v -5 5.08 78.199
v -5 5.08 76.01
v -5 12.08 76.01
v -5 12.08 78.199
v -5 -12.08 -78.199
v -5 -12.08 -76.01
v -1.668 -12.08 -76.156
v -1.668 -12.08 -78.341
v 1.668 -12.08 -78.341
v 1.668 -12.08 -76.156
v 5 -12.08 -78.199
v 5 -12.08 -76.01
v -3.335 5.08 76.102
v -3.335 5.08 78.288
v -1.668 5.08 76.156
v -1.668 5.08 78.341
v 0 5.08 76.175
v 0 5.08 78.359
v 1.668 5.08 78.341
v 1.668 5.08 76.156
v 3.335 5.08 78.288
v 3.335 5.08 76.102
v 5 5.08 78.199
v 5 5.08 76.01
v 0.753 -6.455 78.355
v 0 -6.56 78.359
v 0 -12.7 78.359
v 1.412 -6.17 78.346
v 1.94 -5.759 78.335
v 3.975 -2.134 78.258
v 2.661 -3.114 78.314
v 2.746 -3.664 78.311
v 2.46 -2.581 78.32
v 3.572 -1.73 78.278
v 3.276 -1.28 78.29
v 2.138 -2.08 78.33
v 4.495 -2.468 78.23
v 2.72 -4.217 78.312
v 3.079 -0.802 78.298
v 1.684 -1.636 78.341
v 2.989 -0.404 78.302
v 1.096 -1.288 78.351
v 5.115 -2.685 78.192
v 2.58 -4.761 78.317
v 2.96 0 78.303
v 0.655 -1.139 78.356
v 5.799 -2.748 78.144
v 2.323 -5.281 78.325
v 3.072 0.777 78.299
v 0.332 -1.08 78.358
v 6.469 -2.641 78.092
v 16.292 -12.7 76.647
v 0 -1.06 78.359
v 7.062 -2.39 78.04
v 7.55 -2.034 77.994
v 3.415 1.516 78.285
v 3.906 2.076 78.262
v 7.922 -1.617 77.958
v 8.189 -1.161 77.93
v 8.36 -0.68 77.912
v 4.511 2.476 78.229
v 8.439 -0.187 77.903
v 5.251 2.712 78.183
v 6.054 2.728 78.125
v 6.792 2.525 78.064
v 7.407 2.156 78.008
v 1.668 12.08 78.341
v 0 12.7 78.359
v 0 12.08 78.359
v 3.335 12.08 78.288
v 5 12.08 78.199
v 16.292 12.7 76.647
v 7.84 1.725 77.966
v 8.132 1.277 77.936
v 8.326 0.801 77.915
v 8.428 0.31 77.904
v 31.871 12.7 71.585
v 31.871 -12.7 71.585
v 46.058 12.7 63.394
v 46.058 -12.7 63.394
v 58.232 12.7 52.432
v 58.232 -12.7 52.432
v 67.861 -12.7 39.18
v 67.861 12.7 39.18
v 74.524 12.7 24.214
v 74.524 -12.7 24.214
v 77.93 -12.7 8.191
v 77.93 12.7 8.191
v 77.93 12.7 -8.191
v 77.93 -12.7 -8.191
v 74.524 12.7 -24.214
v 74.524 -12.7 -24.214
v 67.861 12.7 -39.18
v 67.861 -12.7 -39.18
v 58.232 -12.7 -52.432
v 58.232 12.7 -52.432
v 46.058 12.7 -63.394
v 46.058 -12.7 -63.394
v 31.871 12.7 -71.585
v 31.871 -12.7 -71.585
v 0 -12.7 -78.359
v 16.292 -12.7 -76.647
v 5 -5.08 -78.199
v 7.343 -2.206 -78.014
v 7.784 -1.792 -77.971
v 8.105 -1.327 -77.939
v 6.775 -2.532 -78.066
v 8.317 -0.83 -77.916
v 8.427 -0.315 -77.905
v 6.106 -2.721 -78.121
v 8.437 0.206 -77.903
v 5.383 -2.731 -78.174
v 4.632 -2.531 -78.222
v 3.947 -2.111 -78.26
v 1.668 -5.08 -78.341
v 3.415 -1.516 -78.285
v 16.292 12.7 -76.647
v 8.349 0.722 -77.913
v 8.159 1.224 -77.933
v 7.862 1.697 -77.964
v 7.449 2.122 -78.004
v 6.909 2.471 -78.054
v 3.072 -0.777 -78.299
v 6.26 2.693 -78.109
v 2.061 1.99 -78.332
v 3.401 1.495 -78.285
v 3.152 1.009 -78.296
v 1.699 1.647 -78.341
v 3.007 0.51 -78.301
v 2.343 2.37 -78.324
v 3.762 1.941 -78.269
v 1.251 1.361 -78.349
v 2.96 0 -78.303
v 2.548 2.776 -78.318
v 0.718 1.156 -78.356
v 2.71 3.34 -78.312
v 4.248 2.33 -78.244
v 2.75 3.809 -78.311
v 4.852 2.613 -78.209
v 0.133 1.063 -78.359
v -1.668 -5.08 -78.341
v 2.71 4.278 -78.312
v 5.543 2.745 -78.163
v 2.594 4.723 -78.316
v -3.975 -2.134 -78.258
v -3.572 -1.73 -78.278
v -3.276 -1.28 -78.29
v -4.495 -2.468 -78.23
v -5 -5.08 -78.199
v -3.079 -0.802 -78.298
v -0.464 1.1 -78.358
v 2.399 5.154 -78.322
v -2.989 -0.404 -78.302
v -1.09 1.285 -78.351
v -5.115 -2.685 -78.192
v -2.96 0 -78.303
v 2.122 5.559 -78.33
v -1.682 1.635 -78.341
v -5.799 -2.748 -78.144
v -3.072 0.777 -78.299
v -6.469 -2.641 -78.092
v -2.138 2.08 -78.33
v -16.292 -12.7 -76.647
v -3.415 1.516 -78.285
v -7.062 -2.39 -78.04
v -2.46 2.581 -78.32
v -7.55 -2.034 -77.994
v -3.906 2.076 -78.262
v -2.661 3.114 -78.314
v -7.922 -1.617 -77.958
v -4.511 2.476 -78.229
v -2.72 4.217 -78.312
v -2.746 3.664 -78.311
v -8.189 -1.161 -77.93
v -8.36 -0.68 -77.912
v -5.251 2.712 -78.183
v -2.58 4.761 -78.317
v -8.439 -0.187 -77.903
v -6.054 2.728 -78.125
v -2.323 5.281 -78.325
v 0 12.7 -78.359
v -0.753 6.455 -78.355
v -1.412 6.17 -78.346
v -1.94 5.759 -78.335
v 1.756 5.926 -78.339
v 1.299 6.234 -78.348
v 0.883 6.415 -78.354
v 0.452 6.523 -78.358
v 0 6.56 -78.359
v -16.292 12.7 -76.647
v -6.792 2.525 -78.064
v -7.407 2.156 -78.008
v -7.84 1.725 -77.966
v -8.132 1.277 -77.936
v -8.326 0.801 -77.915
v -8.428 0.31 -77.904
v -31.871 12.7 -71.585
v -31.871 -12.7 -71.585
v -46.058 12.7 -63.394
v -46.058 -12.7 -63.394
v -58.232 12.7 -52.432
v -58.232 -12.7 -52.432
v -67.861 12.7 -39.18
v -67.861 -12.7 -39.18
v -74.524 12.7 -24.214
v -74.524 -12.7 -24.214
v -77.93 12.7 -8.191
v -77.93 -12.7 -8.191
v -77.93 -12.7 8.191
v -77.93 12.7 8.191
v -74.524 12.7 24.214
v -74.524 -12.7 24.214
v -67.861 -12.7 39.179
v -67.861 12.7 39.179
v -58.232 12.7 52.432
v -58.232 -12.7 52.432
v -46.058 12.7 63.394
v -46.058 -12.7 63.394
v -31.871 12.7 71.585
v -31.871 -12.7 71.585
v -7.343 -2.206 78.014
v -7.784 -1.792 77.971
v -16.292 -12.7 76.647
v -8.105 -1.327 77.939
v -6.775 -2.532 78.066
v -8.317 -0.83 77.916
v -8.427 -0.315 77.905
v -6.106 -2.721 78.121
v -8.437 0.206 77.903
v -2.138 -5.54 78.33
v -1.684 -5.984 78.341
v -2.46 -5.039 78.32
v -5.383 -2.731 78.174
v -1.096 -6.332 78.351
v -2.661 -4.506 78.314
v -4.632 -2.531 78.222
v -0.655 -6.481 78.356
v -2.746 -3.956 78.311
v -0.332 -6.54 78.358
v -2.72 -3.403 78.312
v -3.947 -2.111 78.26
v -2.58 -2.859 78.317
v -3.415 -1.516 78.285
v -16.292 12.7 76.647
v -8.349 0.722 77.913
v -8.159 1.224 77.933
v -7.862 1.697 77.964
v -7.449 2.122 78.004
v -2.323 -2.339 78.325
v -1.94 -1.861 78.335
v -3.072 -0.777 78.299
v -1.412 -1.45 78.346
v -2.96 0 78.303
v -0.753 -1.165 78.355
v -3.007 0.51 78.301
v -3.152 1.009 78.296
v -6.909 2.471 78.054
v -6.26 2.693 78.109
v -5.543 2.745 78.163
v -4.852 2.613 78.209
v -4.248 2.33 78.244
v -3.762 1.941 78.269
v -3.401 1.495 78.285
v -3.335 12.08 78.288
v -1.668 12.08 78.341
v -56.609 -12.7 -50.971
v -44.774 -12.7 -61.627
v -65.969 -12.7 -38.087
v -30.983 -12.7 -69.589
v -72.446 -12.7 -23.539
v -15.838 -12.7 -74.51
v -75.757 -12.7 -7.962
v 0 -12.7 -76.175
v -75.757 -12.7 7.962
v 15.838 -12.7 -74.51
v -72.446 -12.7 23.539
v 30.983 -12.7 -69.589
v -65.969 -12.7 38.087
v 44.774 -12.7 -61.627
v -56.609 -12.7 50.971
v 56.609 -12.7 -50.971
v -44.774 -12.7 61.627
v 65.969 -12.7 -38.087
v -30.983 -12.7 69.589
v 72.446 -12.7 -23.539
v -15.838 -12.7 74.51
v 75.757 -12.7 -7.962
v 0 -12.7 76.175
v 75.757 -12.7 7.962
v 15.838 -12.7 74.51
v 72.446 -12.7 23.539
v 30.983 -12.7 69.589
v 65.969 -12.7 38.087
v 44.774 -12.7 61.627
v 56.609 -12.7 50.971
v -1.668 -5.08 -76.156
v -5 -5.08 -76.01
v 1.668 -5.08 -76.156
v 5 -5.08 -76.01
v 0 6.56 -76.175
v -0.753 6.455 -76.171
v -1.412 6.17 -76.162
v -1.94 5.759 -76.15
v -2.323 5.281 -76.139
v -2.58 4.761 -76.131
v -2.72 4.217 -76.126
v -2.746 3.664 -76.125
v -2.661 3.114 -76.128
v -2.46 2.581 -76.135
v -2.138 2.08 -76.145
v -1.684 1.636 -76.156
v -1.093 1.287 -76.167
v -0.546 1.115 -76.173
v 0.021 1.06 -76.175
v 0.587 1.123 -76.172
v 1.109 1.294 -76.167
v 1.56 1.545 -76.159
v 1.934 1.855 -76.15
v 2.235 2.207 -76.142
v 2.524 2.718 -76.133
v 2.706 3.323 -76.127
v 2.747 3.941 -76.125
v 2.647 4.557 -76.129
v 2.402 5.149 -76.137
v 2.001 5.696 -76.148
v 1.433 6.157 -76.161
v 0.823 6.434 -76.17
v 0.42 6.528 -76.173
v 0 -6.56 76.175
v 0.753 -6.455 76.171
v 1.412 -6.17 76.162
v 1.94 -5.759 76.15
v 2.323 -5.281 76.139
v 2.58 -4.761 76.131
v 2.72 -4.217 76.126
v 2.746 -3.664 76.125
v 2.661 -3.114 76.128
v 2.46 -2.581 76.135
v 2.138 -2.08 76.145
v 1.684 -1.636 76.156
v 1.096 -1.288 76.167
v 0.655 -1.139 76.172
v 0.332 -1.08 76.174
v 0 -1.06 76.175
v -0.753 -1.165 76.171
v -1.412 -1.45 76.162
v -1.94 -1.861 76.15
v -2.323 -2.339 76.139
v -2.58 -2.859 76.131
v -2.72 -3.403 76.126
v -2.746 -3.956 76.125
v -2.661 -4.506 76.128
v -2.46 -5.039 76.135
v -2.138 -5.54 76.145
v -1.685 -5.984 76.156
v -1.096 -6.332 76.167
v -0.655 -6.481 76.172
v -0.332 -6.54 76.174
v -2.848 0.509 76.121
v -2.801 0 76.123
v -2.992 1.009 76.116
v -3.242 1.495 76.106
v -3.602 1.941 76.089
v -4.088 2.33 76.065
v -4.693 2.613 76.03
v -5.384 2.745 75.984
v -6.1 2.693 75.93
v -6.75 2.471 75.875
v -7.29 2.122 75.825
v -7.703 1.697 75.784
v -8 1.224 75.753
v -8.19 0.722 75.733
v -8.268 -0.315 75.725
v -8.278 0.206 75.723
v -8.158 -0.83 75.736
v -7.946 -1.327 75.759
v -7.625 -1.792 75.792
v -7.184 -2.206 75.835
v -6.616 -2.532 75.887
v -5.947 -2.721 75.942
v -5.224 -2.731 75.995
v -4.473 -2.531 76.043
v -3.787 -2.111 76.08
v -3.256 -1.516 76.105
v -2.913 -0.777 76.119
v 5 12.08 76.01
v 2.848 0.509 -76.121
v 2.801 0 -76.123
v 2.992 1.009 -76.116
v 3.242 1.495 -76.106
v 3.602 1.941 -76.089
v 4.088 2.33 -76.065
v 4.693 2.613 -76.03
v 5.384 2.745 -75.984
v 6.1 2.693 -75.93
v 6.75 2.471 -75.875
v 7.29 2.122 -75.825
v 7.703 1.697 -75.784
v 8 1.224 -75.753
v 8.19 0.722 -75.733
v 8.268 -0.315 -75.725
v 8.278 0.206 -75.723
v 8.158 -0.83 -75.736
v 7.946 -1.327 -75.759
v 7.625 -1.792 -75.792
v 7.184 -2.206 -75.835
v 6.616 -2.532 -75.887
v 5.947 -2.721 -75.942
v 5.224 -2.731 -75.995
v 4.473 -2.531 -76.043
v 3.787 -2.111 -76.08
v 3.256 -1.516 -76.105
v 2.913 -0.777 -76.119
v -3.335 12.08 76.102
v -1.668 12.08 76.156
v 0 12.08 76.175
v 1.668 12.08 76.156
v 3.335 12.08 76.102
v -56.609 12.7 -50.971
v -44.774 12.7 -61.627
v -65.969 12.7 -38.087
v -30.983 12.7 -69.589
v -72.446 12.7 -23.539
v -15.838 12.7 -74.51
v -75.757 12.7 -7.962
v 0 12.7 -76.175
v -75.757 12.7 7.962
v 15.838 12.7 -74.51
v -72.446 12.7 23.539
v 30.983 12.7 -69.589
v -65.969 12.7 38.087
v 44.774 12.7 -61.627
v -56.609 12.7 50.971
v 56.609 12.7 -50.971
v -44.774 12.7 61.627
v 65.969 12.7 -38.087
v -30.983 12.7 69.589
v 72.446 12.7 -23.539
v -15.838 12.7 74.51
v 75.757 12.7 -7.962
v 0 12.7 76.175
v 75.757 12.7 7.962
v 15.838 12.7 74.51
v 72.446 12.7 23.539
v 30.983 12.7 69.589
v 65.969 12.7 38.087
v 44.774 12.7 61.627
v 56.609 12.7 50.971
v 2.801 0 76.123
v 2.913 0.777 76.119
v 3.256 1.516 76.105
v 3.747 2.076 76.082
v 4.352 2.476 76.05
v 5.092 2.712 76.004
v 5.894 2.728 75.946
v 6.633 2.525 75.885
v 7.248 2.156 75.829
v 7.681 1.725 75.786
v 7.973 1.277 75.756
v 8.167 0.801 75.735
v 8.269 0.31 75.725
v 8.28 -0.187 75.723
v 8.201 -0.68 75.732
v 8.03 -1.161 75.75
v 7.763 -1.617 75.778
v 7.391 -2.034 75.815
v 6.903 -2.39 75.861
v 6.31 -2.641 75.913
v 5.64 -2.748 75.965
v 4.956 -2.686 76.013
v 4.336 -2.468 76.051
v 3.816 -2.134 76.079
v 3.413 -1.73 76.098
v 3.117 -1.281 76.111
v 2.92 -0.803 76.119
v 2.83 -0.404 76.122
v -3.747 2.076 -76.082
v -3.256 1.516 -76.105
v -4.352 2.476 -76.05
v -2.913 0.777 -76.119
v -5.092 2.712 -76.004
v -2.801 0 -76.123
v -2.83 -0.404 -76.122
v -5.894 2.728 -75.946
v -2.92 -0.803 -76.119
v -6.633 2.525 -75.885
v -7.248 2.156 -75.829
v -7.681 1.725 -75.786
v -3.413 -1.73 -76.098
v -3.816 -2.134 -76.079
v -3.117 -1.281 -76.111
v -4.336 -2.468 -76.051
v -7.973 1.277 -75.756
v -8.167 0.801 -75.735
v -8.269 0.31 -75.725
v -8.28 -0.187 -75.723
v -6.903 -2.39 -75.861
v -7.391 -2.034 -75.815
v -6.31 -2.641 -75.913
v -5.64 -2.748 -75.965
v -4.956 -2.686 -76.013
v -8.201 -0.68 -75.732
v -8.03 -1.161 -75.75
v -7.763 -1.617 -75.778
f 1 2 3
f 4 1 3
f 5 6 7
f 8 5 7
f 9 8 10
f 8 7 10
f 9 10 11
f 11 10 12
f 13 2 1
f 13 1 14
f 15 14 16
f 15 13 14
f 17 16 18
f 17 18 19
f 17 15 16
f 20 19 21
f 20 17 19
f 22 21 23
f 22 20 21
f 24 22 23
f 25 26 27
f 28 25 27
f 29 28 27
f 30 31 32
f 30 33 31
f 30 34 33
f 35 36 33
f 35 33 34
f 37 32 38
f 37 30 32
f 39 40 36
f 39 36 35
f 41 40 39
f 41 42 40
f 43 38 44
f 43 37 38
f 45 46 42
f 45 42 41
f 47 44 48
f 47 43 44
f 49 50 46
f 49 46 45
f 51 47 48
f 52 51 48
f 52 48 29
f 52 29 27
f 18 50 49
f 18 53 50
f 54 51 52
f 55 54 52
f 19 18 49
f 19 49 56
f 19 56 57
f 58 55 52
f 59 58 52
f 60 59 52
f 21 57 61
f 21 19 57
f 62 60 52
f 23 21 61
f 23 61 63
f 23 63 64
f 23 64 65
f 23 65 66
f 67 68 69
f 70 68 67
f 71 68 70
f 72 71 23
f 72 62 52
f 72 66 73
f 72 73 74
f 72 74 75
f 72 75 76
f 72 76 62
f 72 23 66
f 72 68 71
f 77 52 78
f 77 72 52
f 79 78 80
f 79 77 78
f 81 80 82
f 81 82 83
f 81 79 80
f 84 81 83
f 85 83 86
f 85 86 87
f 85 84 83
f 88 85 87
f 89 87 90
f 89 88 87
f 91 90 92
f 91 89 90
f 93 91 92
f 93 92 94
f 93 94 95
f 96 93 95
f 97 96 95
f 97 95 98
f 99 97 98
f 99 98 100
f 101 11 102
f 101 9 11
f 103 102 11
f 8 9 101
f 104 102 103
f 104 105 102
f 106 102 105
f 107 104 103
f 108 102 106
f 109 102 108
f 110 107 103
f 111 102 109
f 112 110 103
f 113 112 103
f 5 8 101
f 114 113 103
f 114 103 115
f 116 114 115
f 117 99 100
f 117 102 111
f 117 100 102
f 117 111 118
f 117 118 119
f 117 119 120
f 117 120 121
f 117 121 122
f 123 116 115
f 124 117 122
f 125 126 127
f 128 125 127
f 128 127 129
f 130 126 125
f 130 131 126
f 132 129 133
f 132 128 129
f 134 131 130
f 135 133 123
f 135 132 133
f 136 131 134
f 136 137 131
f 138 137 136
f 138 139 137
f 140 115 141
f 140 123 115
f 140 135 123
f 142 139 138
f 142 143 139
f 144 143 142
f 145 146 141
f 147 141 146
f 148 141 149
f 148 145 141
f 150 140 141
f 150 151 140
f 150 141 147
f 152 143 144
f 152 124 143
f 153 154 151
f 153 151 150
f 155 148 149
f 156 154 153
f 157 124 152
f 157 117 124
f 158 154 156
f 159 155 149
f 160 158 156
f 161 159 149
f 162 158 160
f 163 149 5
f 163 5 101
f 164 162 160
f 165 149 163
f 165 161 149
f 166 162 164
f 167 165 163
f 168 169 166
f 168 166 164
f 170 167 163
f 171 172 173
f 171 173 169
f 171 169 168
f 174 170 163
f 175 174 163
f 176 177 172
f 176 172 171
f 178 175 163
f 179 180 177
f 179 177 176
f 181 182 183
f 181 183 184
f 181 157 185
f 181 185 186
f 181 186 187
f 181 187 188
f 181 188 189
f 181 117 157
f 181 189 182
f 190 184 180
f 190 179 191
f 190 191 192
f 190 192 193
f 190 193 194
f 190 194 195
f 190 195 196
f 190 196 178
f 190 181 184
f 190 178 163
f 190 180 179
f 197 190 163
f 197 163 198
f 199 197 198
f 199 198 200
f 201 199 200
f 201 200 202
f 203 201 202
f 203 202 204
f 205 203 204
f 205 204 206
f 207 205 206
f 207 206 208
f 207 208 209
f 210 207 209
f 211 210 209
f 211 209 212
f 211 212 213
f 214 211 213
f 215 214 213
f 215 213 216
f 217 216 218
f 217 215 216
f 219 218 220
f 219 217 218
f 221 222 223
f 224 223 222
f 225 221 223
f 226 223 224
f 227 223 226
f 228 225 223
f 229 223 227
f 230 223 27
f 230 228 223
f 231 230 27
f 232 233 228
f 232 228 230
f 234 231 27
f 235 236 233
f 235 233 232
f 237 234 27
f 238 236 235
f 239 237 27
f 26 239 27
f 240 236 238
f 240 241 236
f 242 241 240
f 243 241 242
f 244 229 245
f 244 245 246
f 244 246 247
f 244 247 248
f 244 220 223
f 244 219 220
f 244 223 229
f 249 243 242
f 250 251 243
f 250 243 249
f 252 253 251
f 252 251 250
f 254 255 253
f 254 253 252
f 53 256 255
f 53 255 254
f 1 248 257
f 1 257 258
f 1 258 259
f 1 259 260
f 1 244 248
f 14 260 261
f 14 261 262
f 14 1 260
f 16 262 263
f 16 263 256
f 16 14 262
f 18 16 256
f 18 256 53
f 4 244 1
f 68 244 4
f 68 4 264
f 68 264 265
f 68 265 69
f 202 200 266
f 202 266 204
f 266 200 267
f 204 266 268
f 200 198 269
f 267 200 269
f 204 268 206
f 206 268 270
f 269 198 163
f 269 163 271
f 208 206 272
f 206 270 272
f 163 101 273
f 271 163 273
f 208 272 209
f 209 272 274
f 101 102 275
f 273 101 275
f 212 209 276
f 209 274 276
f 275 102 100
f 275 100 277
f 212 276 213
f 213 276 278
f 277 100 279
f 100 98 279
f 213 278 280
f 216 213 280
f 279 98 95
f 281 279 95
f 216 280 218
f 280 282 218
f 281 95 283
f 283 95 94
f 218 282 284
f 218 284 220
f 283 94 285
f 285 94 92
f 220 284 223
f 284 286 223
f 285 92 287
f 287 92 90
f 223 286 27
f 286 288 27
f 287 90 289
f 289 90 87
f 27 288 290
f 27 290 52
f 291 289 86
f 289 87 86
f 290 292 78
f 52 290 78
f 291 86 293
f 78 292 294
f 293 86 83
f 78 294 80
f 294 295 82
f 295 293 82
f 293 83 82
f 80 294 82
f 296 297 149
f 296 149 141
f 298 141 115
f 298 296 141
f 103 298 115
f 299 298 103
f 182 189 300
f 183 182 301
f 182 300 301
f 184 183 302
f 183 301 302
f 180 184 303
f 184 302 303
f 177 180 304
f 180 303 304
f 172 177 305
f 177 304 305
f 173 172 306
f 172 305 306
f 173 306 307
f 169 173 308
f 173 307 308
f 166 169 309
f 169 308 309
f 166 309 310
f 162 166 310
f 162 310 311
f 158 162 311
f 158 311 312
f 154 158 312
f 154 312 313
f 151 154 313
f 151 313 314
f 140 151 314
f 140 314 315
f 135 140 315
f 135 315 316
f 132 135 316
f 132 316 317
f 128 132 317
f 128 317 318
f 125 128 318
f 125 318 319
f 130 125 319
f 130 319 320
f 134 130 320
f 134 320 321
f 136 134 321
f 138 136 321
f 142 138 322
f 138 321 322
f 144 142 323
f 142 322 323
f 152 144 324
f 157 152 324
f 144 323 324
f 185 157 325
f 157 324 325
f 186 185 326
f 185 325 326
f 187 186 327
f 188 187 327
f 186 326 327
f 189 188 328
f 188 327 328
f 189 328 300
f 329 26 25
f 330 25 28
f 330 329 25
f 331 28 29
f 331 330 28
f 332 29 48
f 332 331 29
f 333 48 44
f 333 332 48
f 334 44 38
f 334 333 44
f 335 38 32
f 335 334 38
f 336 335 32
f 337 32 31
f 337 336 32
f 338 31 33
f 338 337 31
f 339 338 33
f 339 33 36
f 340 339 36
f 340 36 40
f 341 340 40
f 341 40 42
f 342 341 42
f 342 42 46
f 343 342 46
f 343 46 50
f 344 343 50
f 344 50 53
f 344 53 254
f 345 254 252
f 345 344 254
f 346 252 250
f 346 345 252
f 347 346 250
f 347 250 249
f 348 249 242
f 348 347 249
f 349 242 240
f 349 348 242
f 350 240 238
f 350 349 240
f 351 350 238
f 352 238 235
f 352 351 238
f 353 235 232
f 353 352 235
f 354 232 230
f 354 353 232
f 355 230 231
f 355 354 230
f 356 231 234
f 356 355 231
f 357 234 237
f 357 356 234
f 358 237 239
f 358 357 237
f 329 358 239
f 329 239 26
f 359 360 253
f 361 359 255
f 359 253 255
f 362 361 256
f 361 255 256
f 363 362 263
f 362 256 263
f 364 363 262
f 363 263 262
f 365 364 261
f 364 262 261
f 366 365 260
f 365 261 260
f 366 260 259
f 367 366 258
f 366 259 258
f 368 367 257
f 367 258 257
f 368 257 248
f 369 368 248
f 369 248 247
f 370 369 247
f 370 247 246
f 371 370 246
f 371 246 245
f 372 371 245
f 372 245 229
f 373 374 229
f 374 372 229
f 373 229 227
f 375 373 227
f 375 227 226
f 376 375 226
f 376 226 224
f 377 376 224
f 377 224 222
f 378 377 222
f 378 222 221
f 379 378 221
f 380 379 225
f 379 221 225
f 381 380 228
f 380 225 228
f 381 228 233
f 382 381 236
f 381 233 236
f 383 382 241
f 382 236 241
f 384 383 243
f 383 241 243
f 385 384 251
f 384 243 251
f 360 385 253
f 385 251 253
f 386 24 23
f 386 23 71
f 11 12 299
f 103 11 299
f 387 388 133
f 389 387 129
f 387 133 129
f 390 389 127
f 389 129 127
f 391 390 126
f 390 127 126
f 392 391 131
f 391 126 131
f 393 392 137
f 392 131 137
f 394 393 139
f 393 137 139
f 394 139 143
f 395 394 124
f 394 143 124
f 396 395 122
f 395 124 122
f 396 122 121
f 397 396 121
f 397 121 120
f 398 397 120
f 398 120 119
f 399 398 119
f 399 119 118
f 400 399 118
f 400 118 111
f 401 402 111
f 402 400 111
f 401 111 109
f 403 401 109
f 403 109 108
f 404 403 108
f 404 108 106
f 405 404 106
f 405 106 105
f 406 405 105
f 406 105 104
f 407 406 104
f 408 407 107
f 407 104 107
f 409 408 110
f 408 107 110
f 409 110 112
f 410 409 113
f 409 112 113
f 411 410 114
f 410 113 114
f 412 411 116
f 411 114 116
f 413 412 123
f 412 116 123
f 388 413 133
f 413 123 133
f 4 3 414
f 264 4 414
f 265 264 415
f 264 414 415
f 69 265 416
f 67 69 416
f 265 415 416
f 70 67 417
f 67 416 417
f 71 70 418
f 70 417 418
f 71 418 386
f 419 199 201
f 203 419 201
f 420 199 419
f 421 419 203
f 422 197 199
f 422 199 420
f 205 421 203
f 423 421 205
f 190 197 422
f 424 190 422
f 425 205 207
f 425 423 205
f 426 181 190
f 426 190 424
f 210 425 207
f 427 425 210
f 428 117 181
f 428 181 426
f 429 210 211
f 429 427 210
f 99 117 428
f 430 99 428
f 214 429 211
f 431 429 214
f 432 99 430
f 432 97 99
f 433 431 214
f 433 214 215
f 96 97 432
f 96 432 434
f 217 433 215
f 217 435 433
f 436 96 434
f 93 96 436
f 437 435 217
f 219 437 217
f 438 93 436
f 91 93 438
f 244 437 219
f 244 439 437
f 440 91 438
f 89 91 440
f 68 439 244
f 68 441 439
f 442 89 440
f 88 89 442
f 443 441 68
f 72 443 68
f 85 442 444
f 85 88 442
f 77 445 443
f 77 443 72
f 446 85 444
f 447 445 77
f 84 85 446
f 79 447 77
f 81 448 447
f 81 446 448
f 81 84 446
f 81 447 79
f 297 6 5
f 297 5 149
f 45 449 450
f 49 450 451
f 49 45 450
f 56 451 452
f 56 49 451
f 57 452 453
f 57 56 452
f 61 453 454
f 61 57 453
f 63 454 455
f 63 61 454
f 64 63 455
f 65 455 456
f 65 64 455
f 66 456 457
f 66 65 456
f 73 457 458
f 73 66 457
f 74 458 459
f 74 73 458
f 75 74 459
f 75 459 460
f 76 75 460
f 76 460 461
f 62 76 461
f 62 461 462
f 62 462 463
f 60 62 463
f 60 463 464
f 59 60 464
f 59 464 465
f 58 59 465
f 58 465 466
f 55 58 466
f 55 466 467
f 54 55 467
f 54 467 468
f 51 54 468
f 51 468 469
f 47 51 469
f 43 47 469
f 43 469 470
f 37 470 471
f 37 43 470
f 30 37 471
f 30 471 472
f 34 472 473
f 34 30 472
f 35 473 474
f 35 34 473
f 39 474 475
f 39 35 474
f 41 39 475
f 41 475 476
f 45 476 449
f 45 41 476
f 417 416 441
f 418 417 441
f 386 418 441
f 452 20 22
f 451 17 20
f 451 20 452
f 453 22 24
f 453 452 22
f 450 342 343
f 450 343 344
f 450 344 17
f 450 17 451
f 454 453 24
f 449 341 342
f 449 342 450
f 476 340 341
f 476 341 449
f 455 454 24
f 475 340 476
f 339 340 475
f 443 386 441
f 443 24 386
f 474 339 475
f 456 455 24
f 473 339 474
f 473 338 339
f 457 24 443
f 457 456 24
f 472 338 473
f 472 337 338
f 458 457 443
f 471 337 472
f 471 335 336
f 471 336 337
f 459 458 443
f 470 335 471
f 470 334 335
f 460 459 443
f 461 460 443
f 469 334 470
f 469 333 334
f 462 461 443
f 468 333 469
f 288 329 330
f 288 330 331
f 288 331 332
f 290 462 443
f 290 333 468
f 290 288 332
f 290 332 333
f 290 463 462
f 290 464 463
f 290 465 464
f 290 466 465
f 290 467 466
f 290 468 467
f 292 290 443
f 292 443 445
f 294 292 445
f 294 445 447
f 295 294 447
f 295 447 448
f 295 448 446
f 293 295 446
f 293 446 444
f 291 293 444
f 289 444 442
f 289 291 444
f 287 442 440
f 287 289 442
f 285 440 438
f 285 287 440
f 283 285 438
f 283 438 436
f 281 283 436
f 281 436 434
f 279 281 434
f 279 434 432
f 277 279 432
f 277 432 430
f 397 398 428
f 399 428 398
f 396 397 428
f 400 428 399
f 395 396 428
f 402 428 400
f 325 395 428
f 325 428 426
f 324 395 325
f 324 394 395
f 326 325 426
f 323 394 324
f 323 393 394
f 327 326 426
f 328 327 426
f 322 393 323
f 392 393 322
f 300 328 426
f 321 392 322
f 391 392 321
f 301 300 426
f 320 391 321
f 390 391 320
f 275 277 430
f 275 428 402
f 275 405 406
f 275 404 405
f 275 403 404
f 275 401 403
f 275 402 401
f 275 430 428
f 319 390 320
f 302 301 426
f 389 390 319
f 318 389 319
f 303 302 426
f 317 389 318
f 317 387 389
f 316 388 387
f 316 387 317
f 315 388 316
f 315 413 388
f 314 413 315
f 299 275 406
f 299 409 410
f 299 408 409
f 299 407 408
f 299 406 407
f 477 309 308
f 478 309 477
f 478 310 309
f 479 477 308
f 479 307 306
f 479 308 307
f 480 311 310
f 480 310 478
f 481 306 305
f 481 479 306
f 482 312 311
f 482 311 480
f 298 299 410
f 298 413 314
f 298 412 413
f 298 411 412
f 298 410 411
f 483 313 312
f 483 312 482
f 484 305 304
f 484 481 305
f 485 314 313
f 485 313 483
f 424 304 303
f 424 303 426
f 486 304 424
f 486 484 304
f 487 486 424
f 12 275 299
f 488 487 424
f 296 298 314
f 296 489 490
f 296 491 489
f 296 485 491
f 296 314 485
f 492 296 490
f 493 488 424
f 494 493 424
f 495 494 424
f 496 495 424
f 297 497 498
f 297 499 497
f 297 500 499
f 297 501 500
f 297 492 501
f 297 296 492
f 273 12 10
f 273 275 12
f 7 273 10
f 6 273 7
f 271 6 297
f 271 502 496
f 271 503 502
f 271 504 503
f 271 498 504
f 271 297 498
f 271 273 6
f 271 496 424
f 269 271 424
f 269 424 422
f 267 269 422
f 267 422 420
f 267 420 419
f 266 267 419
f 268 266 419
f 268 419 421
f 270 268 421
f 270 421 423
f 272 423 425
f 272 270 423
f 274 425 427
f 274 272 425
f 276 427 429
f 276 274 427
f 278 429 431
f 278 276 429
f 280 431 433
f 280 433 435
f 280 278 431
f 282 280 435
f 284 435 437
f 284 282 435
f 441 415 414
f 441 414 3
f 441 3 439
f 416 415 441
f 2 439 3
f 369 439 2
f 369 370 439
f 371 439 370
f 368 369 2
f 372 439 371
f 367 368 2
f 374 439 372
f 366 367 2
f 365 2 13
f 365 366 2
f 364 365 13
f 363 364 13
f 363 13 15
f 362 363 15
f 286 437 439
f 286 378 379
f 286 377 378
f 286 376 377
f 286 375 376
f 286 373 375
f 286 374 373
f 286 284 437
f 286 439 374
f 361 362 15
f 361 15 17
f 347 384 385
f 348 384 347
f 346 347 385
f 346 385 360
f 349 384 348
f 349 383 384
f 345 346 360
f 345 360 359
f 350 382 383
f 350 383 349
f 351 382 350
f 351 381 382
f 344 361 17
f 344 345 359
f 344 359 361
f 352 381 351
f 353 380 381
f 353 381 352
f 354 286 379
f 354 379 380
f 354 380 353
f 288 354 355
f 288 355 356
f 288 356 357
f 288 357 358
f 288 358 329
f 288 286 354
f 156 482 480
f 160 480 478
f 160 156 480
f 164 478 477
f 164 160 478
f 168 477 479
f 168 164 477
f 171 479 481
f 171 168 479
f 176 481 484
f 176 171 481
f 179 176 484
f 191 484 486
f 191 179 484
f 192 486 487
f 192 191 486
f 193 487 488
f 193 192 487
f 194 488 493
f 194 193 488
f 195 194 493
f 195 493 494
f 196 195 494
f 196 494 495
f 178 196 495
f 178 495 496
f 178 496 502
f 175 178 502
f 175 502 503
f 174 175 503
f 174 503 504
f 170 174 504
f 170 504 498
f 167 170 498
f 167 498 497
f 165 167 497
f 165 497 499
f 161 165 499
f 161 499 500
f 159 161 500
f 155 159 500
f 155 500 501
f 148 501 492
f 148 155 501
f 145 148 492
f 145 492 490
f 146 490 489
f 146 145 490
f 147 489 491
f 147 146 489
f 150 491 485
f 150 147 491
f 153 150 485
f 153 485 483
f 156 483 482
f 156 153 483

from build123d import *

# Parameters (mm, degrees)
SKETCH1_R               = 78.359
SKETCH1_R_2             = 76.1746
BOSS_EXTRUDE1_DEPTH     = 12.7
CUT_SWEEP1_START        = -78.35900006
CUT_SWEEP1_OUTLINE_R    = 2.749999961
CUT_SWEEP1_DEPTH        = 2.234055593
MIRROR2_START           = -78.35900006
MIRROR2_COPY_1_SKETCH_R = 2.749999961
MIRROR2_COPY_1_DEPTH    = 2.234055593
SKETCH18_R              = 2.749999961
SKETCH18_W              = 10.000000066
SKETCH18_H              = 6.99999997
CUT_EXTRUDE1_DEPTH      = 112.54172222
SKETCH18_3_R            = 2.749999961
SKETCH18_3_W            = 10.000000066
SKETCH18_3_H            = 6.99999997
CUT_EXTRUDE2_DEPTH      = 112.541722222


# Read off the part's stored shape, not the designer's step: Cut-Sweep1
with BuildPart() as part:
    # Sketch1 → Boss-Extrude1 (new, symmetric)
    with BuildSketch(Plane(origin=(0, 0, 0), x_dir=(1, 0, 0), z_dir=(0, 1, 0))):
        with Locations(Location((0, 0, 0), (0, 0, 270))):
            Circle(SKETCH1_R)
        with Locations(Location((0, 0, 0), (0, 0, 270))):
            Circle(SKETCH1_R_2, mode=Mode.SUBTRACT)
    extrude(amount=BOSS_EXTRUDE1_DEPTH, both=True)

    # Cut-Sweep1 outline → Cut-Sweep1 (cut)
    with BuildSketch(Plane(origin=(0, 0, 0), x_dir=(0.99734525831366, 0, -0.0728178255598082), z_dir=(0.0728178255598082, 0, 0.99734525831366)).offset(CUT_SWEEP1_START)):
        Circle(CUT_SWEEP1_OUTLINE_R)
    cut_sweep1 = extrude(amount=CUT_SWEEP1_DEPTH, mode=Mode.SUBTRACT)

    # Mirror1: Cut-Sweep1 across plane
    add(cut_sweep1.mirror(Plane(origin=(0, 0, 0), x_dir=(0, 0, 1), z_dir=(1, 0, 0))), mode=Mode.SUBTRACT)

    # Mirror2: Cut-Sweep1 across plane
    add(cut_sweep1.mirror(Plane.XY), mode=Mode.SUBTRACT)

    # Mirror2 copy 1 sketch → Mirror2 copy 1 (cut)
    with BuildSketch(Plane(origin=(0, 0, 0), x_dir=(-0.99734525831366, 0, 0.0728178255598082), z_dir=(-0.0728178255598082, 0, -0.99734525831366)).offset(MIRROR2_START)):
        Circle(MIRROR2_COPY_1_SKETCH_R)
    extrude(amount=MIRROR2_COPY_1_DEPTH, mode=Mode.SUBTRACT)

    # Sketch18 → Cut-Extrude1 (cut, through all)
    with BuildSketch(Plane.XY):
        with Locations(Location((0, 3.81, 0), (0, 0, 90))):
            Circle(SKETCH18_R)
        with Locations((0, -8.579999985)):
            Rectangle(SKETCH18_W, SKETCH18_H)
    extrude(amount=-CUT_EXTRUDE1_DEPTH, mode=Mode.SUBTRACT)

    # Sketch18<3> → Cut-Extrude2 (cut, through all)
    with BuildSketch(Plane.XY):
        with Locations(Location((0, -3.81, 0), (0, 0, 269.999999951))):
            Circle(SKETCH18_3_R)
        with Locations((0, 8.579999985)):
            Rectangle(SKETCH18_3_W, SKETCH18_3_H)
    extrude(amount=CUT_EXTRUDE2_DEPTH, mode=Mode.SUBTRACT)


solid = part.part
